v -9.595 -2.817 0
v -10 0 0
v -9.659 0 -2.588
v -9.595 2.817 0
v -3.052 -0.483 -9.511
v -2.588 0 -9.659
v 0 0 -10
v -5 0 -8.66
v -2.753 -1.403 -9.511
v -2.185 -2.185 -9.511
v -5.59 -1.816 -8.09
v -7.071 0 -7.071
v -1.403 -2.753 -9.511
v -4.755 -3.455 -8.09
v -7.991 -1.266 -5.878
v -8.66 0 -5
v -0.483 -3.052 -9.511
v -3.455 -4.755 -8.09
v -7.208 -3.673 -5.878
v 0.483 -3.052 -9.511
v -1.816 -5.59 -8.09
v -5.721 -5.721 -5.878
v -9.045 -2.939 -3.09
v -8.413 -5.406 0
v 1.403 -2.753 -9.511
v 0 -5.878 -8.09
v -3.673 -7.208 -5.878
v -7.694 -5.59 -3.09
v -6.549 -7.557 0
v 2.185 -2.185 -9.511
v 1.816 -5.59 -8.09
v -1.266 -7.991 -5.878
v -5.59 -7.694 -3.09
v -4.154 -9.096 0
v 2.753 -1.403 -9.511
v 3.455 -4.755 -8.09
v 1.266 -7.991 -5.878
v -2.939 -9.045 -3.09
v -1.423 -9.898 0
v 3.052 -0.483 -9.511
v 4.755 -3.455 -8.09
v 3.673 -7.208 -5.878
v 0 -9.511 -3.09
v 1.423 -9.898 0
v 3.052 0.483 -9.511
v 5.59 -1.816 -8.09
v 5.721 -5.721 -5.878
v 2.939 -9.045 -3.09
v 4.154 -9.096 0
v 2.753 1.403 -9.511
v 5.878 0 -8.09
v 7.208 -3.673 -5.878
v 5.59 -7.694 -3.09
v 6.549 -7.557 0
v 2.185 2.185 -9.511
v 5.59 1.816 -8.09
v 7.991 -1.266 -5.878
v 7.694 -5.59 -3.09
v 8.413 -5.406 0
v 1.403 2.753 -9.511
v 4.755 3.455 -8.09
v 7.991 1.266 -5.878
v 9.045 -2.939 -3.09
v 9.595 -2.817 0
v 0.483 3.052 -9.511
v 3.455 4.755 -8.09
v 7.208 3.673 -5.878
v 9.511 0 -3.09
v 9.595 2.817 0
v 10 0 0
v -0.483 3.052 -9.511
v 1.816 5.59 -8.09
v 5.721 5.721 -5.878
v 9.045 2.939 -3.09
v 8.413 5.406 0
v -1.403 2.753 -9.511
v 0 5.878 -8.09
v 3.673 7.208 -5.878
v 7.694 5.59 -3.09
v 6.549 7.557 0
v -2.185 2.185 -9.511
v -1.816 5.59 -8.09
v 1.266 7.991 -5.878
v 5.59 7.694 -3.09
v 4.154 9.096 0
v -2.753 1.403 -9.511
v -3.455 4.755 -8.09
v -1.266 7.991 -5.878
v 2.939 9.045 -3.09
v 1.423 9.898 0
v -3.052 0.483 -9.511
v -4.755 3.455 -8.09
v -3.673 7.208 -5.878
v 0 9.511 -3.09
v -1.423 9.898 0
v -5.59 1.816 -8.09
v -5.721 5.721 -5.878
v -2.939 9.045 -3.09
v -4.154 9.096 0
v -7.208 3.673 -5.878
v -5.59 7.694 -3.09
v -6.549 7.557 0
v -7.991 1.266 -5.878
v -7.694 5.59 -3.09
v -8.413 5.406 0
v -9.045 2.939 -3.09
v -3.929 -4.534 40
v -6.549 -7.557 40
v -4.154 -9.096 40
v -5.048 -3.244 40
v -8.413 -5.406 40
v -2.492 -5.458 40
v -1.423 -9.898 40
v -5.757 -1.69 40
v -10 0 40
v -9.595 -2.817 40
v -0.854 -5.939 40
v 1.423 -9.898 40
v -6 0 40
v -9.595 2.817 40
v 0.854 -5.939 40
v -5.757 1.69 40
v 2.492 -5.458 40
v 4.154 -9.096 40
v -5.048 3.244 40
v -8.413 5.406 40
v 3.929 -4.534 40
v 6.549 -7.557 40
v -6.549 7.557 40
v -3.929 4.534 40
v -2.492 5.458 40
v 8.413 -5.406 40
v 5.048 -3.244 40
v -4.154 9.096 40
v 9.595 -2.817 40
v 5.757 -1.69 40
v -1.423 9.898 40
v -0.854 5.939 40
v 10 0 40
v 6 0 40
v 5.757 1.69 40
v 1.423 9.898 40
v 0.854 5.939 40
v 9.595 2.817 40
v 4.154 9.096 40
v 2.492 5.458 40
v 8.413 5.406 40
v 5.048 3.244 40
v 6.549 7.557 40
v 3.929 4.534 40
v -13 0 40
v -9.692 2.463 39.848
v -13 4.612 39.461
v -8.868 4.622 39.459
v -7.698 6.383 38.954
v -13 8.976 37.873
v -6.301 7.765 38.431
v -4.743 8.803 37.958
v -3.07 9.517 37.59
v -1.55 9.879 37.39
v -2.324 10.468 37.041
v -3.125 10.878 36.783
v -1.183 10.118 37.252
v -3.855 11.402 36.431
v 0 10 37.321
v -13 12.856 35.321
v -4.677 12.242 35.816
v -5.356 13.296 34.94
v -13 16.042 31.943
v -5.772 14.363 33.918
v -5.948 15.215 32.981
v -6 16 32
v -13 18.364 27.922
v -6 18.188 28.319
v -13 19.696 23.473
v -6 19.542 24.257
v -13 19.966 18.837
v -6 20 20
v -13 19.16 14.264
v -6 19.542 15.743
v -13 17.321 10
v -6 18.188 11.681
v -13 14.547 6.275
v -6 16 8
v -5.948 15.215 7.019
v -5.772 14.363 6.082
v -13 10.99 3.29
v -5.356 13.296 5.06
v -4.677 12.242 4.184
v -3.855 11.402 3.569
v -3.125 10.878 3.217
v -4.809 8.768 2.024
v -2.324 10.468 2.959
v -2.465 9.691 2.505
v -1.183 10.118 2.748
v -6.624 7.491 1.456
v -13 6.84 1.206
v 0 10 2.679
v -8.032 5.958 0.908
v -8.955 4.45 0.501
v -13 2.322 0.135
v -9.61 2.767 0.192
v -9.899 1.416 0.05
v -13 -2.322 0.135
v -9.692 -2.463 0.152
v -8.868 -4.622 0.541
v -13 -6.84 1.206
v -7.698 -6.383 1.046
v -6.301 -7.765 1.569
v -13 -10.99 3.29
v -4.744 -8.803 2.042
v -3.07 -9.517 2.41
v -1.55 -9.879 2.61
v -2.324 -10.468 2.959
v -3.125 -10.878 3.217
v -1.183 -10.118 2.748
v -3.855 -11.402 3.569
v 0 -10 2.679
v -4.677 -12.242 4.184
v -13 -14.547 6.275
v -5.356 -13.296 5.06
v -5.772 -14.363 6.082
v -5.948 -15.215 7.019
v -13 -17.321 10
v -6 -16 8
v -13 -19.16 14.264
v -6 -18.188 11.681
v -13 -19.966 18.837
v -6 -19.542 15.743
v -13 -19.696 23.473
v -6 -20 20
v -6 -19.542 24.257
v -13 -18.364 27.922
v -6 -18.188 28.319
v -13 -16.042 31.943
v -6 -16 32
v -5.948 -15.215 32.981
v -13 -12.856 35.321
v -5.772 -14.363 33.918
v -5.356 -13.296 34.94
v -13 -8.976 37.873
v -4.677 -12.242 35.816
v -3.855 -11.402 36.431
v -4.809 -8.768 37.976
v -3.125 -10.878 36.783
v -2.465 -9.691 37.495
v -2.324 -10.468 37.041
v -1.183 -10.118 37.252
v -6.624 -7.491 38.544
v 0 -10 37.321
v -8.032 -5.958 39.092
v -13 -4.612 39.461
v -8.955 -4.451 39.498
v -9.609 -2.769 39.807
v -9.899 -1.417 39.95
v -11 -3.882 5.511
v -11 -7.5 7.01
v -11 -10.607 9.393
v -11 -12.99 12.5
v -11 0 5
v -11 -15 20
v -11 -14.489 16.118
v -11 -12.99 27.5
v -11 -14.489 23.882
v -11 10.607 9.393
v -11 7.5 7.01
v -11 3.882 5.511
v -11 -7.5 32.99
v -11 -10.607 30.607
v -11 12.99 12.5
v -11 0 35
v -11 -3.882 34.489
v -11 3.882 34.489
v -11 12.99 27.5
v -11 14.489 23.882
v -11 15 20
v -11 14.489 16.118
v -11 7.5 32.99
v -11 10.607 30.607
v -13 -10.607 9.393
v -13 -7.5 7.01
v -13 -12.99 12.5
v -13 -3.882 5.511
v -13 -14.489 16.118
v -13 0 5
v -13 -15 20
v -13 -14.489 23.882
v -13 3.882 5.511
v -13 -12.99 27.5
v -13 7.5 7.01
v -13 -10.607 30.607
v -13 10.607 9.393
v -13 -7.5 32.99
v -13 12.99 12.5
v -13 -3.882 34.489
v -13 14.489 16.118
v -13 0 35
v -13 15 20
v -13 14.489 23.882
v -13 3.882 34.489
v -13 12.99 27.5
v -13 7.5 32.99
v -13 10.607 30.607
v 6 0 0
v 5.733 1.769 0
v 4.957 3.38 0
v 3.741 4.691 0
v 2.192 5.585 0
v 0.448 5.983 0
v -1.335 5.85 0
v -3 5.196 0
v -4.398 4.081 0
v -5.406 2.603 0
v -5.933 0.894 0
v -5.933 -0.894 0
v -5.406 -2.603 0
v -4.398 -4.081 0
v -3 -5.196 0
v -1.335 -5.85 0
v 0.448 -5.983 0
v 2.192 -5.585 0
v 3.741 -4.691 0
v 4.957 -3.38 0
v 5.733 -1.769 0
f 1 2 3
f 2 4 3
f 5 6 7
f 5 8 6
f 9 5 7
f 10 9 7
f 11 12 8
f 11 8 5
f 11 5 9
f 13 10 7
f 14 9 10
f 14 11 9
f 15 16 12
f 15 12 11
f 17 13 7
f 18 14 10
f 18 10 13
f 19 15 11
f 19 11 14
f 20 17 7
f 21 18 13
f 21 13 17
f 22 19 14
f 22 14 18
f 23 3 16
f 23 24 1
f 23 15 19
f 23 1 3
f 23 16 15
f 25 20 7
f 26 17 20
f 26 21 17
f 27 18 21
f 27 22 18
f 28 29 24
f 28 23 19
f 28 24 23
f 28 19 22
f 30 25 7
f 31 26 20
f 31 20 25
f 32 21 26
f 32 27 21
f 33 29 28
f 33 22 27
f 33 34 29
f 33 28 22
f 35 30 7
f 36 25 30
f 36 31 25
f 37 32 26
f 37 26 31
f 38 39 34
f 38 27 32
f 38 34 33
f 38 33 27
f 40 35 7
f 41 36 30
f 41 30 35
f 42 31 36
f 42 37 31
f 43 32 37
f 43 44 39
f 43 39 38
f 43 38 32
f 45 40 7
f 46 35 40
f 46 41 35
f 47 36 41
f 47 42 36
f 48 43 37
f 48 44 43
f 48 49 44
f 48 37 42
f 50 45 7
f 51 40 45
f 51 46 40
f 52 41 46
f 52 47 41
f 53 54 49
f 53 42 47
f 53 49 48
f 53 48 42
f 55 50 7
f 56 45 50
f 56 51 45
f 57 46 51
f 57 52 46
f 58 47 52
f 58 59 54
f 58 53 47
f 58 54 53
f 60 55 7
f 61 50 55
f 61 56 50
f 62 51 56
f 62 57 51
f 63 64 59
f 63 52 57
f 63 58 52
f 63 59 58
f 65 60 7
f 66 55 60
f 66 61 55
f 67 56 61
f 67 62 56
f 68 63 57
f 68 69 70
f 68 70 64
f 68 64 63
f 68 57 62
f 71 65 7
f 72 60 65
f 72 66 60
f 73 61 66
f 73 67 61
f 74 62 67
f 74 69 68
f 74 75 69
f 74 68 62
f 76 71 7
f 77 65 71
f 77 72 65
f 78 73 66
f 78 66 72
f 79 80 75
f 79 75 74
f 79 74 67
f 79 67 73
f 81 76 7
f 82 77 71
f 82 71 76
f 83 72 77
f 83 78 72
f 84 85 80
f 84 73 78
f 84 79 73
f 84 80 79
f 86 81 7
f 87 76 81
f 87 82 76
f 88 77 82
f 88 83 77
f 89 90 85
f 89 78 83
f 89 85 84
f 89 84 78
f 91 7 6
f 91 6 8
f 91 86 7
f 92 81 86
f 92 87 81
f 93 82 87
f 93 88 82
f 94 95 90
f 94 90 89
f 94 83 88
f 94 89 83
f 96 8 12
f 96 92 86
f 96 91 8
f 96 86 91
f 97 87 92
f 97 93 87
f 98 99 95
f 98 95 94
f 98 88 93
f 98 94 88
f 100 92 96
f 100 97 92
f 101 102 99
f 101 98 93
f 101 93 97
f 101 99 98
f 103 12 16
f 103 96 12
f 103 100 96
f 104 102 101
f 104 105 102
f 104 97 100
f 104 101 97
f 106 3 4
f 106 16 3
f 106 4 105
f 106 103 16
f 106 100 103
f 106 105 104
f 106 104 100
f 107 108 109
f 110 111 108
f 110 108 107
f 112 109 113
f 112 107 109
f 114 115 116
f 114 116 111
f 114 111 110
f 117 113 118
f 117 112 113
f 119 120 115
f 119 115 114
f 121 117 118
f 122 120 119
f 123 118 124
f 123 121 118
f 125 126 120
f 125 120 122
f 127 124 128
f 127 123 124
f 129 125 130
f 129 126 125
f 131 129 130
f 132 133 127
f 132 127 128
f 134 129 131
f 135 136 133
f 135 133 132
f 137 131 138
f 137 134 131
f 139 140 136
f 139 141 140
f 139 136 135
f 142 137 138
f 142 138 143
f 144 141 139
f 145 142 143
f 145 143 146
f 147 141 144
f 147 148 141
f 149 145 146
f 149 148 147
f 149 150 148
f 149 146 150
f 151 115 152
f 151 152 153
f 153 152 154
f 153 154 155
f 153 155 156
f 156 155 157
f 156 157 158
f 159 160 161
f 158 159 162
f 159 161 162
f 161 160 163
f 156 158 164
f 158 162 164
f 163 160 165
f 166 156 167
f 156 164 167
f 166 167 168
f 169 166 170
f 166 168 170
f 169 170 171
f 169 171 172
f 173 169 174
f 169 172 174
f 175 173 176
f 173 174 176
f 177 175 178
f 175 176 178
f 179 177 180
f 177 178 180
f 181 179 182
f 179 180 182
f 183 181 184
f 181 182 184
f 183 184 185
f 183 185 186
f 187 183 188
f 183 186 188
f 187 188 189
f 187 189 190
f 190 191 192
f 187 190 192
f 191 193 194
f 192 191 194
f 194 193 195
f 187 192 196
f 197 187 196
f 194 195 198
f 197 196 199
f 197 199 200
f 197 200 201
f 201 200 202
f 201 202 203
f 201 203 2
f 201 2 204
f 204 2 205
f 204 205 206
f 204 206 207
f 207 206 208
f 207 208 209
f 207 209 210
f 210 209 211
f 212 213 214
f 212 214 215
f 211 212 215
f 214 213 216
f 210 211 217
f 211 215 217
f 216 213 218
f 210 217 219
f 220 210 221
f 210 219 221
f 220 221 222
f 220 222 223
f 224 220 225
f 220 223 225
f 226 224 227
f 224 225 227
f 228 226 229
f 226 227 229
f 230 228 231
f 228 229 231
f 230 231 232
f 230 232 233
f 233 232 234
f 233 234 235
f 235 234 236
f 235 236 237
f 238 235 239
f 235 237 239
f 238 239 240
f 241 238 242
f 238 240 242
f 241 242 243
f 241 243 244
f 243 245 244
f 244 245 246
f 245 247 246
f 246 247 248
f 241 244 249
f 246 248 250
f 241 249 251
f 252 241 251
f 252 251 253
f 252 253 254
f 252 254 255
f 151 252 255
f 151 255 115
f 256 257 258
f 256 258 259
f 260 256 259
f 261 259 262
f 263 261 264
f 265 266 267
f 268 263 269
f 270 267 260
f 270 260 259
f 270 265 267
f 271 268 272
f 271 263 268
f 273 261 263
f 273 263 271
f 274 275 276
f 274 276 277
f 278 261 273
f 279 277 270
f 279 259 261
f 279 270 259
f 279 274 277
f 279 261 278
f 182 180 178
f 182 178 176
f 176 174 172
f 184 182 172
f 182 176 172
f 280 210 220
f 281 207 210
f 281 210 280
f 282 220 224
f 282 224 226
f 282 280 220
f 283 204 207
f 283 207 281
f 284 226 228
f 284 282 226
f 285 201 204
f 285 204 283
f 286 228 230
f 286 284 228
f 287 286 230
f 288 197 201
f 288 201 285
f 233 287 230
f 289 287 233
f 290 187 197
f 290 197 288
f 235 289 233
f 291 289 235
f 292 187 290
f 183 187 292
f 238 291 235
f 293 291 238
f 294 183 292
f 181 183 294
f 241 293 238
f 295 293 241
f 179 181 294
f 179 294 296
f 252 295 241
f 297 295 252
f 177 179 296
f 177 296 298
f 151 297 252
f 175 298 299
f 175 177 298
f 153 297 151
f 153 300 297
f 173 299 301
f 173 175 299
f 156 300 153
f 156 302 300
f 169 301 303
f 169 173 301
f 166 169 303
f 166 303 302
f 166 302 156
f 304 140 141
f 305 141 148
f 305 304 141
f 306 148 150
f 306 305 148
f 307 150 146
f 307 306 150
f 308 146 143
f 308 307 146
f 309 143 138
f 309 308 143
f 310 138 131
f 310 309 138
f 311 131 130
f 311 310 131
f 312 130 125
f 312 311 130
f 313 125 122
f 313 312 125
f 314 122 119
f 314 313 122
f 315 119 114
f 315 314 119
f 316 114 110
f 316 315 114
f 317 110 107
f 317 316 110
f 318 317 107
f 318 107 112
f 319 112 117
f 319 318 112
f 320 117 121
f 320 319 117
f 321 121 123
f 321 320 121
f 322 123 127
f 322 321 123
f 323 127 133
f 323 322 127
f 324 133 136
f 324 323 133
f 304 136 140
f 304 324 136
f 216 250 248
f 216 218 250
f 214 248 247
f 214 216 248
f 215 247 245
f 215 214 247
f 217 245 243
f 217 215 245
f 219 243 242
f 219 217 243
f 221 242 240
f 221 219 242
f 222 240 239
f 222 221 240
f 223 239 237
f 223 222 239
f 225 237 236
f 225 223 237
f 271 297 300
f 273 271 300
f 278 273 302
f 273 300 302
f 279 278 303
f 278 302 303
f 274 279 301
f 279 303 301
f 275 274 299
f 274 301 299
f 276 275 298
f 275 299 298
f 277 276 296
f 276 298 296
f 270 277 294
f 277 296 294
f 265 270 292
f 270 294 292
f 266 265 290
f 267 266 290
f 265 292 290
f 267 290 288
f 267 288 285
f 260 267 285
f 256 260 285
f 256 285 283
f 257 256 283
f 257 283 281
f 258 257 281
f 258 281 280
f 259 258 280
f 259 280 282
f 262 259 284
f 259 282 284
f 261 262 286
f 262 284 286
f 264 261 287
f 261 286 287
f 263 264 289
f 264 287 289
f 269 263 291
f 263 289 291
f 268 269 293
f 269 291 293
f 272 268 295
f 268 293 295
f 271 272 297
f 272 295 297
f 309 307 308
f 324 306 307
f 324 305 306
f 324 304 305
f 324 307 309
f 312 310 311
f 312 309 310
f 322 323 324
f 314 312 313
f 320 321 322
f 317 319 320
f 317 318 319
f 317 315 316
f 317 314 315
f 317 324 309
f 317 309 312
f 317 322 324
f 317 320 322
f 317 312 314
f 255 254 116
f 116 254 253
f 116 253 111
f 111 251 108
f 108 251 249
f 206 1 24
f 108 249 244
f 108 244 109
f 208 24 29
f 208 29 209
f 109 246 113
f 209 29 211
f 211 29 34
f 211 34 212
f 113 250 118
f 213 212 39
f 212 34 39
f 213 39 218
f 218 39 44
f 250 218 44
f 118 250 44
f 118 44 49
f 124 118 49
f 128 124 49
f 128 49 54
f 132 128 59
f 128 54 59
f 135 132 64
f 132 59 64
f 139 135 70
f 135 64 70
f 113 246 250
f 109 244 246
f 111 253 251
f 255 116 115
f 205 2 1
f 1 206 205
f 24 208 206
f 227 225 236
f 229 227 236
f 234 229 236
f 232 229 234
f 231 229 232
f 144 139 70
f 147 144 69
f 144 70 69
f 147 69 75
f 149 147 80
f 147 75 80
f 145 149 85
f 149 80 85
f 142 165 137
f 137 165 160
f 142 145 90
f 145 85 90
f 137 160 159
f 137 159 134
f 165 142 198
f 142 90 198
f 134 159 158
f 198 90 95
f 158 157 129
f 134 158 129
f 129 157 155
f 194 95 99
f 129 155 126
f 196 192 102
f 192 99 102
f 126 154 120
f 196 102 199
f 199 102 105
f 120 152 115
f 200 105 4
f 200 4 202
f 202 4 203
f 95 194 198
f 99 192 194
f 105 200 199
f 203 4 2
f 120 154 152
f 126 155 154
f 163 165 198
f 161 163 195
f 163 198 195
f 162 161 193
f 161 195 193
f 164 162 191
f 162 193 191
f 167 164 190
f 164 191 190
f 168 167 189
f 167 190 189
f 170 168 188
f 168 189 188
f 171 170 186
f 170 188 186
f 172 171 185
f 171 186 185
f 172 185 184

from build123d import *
from build123d.topology import SkipClean

# Parameters (mm, degrees)
SKETCH1_R                = 10
SKETCH1_R_2              = 6
BOSS_EXTRUDE1_DEPTH      = 40
BOSS_EXTRUDE4_DEPTH      = 3
BOSS_EXTRUDE4_DEPTH_BACK = 4
SKETCH7_R                = 20
FILLET3_R                = 6
SKETCH8_R                = 15
CUT_EXTRUDE3_DEPTH       = 2


with BuildPart() as part:
    # Sketch1 → Boss-Extrude1 (new body)
    with BuildSketch(Plane.XY):
        Circle(SKETCH1_R)
        Circle(SKETCH1_R_2, mode=Mode.SUBTRACT)
    extrude(amount=BOSS_EXTRUDE1_DEPTH)

    # Sketch6 → Revolve1 (revolve)
    with BuildSketch(Plane(origin=(0, 0, 0), x_dir=(1, 0, 0), z_dir=(0, 1, 0))):
        with BuildLine():
            Line((-10, 0), (0, 0))
            Line((0, 0), (0, 10))
            ThreePointArc((0, 10), (-7.071067812, 7.071067812), (-10, 0))
        make_face()
    revolve(axis=Axis((0, 0, -10), (0, 0, 1)))

    # Sketch7 → Boss-Extrude4 (add, two sides: drawn at the far end of the back side and taken through both)
    with SkipClean():  # the faces are left unmerged after this step: merging them gives an invalid solid
        with BuildSketch(Plane.ZY.offset(10).offset(-BOSS_EXTRUDE4_DEPTH_BACK)):
            with Locations((20, 0)):
                Circle(SKETCH7_R)
        extrude(amount=BOSS_EXTRUDE4_DEPTH + BOSS_EXTRUDE4_DEPTH_BACK)

    # Fillet3
    fillet3_edges = [part.edges().sort_by_distance(p)[0] for p in [
        (-6, 8, 20),
        (-6, -8, 20),
    ]]
    fillet(fillet3_edges, radius=FILLET3_R)

    # Sketch8 → Cut-Extrude3 (cut)
    with BuildSketch(Plane.ZY.offset(13)):
        with Locations((20, 0)):
            Circle(SKETCH8_R)
    extrude(amount=-CUT_EXTRUDE3_DEPTH, mode=Mode.SUBTRACT)


solid = part.part
